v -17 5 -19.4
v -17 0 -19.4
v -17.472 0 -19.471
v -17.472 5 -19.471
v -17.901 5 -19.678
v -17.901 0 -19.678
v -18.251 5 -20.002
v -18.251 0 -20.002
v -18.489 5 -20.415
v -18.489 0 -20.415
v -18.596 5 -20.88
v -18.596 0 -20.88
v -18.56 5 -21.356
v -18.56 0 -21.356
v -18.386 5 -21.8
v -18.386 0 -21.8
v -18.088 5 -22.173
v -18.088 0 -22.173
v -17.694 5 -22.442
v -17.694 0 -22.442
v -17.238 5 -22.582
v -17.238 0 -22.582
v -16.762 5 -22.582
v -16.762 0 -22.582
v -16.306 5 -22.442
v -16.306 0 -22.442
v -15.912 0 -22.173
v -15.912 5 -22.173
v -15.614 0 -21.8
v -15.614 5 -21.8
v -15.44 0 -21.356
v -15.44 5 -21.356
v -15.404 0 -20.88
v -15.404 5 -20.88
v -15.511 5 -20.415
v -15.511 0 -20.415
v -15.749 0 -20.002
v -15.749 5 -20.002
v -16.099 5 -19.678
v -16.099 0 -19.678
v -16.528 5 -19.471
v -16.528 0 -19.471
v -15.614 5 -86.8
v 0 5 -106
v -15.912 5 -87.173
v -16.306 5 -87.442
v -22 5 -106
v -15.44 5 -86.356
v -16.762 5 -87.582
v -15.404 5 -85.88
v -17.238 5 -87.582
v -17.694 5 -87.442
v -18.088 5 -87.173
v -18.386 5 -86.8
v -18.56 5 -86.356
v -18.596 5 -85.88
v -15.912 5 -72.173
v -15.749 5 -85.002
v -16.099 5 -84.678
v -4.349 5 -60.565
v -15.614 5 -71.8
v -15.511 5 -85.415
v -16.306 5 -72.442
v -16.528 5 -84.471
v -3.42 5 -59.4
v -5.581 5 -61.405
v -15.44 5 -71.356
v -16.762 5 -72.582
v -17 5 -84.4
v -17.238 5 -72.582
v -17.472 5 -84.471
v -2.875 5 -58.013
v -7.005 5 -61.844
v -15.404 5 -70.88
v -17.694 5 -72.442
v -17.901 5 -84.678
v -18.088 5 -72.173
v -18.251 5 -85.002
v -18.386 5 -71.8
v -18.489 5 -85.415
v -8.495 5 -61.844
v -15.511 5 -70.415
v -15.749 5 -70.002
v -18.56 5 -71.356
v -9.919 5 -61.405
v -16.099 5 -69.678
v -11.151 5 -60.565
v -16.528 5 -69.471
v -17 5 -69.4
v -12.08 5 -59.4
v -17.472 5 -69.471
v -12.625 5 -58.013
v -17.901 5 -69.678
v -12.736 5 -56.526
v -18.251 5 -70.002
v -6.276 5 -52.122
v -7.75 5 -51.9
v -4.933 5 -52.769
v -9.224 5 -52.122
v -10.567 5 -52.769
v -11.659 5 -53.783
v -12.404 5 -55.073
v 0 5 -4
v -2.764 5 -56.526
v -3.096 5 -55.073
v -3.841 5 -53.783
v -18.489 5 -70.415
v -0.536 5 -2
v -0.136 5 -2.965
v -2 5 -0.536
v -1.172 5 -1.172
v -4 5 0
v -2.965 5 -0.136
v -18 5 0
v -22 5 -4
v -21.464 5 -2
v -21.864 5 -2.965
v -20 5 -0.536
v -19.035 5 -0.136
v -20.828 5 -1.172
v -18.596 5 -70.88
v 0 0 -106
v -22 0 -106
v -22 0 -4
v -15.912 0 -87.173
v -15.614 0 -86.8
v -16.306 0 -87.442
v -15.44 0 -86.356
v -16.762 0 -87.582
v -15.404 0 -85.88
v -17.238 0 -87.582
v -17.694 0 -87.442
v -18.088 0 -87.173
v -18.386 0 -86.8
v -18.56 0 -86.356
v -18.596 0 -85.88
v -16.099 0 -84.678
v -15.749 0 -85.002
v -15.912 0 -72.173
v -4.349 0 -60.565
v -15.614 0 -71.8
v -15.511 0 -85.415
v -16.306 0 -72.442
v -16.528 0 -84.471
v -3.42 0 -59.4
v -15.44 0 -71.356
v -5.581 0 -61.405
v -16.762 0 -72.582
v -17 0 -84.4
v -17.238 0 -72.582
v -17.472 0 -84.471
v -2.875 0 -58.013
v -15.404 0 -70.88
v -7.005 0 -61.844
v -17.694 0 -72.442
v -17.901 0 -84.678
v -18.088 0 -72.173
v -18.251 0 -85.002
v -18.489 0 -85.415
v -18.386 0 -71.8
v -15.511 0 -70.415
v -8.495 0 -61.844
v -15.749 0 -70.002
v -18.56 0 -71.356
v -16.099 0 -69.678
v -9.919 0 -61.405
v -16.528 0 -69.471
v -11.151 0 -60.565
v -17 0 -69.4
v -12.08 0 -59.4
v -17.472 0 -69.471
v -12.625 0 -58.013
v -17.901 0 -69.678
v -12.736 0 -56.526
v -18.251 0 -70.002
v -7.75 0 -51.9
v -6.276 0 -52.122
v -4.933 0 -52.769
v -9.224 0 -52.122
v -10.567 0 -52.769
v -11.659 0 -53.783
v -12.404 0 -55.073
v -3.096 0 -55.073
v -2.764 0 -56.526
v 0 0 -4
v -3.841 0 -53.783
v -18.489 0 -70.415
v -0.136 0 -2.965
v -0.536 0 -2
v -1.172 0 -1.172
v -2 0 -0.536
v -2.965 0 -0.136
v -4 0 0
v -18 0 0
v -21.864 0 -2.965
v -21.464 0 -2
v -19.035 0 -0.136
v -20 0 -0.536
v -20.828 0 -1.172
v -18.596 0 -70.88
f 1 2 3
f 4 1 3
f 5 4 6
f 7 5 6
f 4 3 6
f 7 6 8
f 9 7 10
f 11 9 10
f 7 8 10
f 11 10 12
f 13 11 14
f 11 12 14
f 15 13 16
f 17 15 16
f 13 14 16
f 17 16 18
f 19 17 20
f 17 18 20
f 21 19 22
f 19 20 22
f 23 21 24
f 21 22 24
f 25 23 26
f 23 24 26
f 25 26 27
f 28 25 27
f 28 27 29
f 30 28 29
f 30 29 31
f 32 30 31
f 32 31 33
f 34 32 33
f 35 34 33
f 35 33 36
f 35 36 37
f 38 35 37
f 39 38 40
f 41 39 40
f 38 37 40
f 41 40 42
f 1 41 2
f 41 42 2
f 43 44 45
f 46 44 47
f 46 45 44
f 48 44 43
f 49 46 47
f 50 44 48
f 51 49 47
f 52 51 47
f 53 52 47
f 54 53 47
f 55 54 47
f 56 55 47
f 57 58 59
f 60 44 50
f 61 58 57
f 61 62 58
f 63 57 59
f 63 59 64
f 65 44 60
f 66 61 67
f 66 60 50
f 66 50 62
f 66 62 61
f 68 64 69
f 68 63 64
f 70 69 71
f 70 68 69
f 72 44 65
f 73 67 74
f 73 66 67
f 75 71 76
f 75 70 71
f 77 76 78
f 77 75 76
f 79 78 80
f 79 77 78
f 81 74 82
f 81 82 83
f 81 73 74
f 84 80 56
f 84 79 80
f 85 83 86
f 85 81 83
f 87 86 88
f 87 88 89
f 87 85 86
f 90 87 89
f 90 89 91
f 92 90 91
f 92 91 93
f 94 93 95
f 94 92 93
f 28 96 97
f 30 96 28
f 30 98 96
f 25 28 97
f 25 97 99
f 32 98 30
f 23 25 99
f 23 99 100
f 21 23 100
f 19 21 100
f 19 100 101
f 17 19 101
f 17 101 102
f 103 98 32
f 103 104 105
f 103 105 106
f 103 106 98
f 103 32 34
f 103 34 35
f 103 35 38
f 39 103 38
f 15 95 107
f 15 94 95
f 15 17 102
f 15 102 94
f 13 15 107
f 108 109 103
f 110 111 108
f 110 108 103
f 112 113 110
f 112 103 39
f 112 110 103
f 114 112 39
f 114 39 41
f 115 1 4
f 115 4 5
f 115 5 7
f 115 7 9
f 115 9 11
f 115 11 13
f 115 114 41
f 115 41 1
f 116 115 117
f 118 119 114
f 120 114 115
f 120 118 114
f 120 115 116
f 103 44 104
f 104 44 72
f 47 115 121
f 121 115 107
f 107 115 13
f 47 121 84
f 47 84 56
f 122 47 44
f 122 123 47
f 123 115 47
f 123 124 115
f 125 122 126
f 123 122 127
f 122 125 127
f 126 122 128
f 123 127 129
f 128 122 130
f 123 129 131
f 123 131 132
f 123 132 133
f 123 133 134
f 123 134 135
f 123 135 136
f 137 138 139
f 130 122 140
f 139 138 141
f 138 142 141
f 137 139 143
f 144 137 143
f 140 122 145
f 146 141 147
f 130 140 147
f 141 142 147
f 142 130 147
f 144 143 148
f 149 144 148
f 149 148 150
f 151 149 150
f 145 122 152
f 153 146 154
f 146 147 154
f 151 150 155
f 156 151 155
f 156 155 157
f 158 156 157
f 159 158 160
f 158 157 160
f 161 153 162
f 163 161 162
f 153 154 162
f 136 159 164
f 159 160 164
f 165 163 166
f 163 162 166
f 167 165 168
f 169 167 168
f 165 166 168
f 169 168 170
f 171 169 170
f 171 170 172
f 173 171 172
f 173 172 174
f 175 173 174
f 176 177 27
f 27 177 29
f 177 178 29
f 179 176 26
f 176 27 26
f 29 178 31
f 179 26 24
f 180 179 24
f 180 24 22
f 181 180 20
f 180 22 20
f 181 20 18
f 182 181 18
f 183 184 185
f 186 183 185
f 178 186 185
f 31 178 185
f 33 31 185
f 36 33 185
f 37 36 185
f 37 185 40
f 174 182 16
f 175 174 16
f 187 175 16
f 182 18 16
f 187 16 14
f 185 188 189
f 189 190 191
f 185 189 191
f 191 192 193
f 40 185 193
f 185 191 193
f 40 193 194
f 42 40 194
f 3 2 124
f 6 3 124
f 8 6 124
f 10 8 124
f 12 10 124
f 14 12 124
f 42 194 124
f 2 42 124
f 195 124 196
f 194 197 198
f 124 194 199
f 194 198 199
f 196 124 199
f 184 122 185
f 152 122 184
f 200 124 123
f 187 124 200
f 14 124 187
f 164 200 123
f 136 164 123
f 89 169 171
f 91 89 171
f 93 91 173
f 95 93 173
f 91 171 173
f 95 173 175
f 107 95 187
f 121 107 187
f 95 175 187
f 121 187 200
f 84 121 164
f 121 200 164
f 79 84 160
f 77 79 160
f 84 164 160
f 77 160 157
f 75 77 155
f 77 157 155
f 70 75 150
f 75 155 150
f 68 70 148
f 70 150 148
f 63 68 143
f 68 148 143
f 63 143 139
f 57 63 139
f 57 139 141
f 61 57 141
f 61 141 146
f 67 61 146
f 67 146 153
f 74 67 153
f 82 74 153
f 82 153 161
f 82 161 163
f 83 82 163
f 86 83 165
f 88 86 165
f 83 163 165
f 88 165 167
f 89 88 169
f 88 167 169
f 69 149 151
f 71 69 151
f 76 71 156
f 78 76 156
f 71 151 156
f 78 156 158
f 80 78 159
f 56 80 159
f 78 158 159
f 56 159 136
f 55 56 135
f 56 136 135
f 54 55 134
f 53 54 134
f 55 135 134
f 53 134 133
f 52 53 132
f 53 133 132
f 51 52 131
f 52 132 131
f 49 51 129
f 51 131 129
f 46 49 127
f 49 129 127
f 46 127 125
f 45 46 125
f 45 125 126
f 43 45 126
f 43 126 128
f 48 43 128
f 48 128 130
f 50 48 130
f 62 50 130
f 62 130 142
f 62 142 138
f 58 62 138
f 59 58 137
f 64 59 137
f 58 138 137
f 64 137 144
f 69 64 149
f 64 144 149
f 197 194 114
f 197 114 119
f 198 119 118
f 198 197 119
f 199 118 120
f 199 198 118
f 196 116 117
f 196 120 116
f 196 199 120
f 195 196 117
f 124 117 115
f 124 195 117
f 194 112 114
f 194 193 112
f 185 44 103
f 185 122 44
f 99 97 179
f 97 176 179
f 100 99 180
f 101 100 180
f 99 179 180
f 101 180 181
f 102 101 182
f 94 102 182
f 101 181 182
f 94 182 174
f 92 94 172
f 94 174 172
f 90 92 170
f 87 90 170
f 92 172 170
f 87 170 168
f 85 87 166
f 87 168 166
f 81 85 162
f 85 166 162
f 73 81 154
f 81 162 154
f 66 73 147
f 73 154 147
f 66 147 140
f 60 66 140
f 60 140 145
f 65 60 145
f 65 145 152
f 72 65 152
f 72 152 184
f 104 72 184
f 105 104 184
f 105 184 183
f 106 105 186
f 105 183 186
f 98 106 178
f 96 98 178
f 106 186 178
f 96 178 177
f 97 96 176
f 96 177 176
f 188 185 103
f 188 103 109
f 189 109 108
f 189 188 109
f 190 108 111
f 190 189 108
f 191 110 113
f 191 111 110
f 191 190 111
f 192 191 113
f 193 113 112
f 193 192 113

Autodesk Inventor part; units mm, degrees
ref_plane "YZ Plane" through (0, 0, 0) normal (1, 0, 0) x (0, 1, 0)
ref_plane "XZ Plane" through (0, 0, 0) normal (0, 1, 0) x (-1, 0, 0)
ref_plane "XY Plane" through (0, 0, 0) normal (0, 0, 1) x (1, 0, 0)
sketch "Sketch1" plane through (0, 0, 0) normal (0, 1, 0) x (-1, 0, 0)
  line L0 (4, 0) -> (18, 0)
  line L1 (22, -4) -> (22, -106)
  line L2 (22, -106) -> (0, -106)
  line L3 (0, -106) -> (0, -4)
  arc A0 (22, -4) -> (18, 0) centre (18, -4) ccw
  arc A1 (4, 0) -> (0, -4) centre (4, -4) ccw
  point P0 (0, 0)
  point P1 (22, 0)
  dimension "d0" = 22
  dimension "d1" = 106
  dimension "d2" = 4
extrude "Extrusion1" add sketch "Sketch1" along normal blind 5
sketch "Sketch2" plane through (0, 5, 0) normal (0, 1, 0) x (1, 0, 0)
  line L0 (-7.75, -15.5804) -> (-7.75, 135.2593) construction
  line L1 (0, 4) -> (0, 106) construction
  line L2 (0, 106) -> (-22, 106) projected
  point P0 (0, 0)
  point P1 (-7.75, 56.9)
  dimension "d5" = 7.75
  dimension "d6" = 49.1
hole "Hole1" at (-7.75, 5, -56.9) direction (0, -1, 0) diameter 10 end through all
sketch "Sketch3" plane through (0, 5, 0) normal (0, 1, 0) x (1, 0, 0)
  line L0 (-17, -17.788) -> (-17, 124.5417) construction
  line L1 (0, 4) -> (0, 106) construction
  line L2 (0, 106) -> (-22, 106) construction
  line L3 (0, 106) -> (-22, 106) construction
  point P0 (0, 0)
  point P1 (-17, 86)
  point P2 (-17, 21)
  point P3 (-17, 71)
  dimension "d14" = 17
  dimension "d15" = 20
  dimension "d16" = 35
  dimension "d17" = 85
hole "Hole2" at (-17, 5, -86) at (-17, 5, -21) at (-17, 5, -71) direction (0, -1, 0) diameter 3.2 end through all
properties part number "upper plate slide"
